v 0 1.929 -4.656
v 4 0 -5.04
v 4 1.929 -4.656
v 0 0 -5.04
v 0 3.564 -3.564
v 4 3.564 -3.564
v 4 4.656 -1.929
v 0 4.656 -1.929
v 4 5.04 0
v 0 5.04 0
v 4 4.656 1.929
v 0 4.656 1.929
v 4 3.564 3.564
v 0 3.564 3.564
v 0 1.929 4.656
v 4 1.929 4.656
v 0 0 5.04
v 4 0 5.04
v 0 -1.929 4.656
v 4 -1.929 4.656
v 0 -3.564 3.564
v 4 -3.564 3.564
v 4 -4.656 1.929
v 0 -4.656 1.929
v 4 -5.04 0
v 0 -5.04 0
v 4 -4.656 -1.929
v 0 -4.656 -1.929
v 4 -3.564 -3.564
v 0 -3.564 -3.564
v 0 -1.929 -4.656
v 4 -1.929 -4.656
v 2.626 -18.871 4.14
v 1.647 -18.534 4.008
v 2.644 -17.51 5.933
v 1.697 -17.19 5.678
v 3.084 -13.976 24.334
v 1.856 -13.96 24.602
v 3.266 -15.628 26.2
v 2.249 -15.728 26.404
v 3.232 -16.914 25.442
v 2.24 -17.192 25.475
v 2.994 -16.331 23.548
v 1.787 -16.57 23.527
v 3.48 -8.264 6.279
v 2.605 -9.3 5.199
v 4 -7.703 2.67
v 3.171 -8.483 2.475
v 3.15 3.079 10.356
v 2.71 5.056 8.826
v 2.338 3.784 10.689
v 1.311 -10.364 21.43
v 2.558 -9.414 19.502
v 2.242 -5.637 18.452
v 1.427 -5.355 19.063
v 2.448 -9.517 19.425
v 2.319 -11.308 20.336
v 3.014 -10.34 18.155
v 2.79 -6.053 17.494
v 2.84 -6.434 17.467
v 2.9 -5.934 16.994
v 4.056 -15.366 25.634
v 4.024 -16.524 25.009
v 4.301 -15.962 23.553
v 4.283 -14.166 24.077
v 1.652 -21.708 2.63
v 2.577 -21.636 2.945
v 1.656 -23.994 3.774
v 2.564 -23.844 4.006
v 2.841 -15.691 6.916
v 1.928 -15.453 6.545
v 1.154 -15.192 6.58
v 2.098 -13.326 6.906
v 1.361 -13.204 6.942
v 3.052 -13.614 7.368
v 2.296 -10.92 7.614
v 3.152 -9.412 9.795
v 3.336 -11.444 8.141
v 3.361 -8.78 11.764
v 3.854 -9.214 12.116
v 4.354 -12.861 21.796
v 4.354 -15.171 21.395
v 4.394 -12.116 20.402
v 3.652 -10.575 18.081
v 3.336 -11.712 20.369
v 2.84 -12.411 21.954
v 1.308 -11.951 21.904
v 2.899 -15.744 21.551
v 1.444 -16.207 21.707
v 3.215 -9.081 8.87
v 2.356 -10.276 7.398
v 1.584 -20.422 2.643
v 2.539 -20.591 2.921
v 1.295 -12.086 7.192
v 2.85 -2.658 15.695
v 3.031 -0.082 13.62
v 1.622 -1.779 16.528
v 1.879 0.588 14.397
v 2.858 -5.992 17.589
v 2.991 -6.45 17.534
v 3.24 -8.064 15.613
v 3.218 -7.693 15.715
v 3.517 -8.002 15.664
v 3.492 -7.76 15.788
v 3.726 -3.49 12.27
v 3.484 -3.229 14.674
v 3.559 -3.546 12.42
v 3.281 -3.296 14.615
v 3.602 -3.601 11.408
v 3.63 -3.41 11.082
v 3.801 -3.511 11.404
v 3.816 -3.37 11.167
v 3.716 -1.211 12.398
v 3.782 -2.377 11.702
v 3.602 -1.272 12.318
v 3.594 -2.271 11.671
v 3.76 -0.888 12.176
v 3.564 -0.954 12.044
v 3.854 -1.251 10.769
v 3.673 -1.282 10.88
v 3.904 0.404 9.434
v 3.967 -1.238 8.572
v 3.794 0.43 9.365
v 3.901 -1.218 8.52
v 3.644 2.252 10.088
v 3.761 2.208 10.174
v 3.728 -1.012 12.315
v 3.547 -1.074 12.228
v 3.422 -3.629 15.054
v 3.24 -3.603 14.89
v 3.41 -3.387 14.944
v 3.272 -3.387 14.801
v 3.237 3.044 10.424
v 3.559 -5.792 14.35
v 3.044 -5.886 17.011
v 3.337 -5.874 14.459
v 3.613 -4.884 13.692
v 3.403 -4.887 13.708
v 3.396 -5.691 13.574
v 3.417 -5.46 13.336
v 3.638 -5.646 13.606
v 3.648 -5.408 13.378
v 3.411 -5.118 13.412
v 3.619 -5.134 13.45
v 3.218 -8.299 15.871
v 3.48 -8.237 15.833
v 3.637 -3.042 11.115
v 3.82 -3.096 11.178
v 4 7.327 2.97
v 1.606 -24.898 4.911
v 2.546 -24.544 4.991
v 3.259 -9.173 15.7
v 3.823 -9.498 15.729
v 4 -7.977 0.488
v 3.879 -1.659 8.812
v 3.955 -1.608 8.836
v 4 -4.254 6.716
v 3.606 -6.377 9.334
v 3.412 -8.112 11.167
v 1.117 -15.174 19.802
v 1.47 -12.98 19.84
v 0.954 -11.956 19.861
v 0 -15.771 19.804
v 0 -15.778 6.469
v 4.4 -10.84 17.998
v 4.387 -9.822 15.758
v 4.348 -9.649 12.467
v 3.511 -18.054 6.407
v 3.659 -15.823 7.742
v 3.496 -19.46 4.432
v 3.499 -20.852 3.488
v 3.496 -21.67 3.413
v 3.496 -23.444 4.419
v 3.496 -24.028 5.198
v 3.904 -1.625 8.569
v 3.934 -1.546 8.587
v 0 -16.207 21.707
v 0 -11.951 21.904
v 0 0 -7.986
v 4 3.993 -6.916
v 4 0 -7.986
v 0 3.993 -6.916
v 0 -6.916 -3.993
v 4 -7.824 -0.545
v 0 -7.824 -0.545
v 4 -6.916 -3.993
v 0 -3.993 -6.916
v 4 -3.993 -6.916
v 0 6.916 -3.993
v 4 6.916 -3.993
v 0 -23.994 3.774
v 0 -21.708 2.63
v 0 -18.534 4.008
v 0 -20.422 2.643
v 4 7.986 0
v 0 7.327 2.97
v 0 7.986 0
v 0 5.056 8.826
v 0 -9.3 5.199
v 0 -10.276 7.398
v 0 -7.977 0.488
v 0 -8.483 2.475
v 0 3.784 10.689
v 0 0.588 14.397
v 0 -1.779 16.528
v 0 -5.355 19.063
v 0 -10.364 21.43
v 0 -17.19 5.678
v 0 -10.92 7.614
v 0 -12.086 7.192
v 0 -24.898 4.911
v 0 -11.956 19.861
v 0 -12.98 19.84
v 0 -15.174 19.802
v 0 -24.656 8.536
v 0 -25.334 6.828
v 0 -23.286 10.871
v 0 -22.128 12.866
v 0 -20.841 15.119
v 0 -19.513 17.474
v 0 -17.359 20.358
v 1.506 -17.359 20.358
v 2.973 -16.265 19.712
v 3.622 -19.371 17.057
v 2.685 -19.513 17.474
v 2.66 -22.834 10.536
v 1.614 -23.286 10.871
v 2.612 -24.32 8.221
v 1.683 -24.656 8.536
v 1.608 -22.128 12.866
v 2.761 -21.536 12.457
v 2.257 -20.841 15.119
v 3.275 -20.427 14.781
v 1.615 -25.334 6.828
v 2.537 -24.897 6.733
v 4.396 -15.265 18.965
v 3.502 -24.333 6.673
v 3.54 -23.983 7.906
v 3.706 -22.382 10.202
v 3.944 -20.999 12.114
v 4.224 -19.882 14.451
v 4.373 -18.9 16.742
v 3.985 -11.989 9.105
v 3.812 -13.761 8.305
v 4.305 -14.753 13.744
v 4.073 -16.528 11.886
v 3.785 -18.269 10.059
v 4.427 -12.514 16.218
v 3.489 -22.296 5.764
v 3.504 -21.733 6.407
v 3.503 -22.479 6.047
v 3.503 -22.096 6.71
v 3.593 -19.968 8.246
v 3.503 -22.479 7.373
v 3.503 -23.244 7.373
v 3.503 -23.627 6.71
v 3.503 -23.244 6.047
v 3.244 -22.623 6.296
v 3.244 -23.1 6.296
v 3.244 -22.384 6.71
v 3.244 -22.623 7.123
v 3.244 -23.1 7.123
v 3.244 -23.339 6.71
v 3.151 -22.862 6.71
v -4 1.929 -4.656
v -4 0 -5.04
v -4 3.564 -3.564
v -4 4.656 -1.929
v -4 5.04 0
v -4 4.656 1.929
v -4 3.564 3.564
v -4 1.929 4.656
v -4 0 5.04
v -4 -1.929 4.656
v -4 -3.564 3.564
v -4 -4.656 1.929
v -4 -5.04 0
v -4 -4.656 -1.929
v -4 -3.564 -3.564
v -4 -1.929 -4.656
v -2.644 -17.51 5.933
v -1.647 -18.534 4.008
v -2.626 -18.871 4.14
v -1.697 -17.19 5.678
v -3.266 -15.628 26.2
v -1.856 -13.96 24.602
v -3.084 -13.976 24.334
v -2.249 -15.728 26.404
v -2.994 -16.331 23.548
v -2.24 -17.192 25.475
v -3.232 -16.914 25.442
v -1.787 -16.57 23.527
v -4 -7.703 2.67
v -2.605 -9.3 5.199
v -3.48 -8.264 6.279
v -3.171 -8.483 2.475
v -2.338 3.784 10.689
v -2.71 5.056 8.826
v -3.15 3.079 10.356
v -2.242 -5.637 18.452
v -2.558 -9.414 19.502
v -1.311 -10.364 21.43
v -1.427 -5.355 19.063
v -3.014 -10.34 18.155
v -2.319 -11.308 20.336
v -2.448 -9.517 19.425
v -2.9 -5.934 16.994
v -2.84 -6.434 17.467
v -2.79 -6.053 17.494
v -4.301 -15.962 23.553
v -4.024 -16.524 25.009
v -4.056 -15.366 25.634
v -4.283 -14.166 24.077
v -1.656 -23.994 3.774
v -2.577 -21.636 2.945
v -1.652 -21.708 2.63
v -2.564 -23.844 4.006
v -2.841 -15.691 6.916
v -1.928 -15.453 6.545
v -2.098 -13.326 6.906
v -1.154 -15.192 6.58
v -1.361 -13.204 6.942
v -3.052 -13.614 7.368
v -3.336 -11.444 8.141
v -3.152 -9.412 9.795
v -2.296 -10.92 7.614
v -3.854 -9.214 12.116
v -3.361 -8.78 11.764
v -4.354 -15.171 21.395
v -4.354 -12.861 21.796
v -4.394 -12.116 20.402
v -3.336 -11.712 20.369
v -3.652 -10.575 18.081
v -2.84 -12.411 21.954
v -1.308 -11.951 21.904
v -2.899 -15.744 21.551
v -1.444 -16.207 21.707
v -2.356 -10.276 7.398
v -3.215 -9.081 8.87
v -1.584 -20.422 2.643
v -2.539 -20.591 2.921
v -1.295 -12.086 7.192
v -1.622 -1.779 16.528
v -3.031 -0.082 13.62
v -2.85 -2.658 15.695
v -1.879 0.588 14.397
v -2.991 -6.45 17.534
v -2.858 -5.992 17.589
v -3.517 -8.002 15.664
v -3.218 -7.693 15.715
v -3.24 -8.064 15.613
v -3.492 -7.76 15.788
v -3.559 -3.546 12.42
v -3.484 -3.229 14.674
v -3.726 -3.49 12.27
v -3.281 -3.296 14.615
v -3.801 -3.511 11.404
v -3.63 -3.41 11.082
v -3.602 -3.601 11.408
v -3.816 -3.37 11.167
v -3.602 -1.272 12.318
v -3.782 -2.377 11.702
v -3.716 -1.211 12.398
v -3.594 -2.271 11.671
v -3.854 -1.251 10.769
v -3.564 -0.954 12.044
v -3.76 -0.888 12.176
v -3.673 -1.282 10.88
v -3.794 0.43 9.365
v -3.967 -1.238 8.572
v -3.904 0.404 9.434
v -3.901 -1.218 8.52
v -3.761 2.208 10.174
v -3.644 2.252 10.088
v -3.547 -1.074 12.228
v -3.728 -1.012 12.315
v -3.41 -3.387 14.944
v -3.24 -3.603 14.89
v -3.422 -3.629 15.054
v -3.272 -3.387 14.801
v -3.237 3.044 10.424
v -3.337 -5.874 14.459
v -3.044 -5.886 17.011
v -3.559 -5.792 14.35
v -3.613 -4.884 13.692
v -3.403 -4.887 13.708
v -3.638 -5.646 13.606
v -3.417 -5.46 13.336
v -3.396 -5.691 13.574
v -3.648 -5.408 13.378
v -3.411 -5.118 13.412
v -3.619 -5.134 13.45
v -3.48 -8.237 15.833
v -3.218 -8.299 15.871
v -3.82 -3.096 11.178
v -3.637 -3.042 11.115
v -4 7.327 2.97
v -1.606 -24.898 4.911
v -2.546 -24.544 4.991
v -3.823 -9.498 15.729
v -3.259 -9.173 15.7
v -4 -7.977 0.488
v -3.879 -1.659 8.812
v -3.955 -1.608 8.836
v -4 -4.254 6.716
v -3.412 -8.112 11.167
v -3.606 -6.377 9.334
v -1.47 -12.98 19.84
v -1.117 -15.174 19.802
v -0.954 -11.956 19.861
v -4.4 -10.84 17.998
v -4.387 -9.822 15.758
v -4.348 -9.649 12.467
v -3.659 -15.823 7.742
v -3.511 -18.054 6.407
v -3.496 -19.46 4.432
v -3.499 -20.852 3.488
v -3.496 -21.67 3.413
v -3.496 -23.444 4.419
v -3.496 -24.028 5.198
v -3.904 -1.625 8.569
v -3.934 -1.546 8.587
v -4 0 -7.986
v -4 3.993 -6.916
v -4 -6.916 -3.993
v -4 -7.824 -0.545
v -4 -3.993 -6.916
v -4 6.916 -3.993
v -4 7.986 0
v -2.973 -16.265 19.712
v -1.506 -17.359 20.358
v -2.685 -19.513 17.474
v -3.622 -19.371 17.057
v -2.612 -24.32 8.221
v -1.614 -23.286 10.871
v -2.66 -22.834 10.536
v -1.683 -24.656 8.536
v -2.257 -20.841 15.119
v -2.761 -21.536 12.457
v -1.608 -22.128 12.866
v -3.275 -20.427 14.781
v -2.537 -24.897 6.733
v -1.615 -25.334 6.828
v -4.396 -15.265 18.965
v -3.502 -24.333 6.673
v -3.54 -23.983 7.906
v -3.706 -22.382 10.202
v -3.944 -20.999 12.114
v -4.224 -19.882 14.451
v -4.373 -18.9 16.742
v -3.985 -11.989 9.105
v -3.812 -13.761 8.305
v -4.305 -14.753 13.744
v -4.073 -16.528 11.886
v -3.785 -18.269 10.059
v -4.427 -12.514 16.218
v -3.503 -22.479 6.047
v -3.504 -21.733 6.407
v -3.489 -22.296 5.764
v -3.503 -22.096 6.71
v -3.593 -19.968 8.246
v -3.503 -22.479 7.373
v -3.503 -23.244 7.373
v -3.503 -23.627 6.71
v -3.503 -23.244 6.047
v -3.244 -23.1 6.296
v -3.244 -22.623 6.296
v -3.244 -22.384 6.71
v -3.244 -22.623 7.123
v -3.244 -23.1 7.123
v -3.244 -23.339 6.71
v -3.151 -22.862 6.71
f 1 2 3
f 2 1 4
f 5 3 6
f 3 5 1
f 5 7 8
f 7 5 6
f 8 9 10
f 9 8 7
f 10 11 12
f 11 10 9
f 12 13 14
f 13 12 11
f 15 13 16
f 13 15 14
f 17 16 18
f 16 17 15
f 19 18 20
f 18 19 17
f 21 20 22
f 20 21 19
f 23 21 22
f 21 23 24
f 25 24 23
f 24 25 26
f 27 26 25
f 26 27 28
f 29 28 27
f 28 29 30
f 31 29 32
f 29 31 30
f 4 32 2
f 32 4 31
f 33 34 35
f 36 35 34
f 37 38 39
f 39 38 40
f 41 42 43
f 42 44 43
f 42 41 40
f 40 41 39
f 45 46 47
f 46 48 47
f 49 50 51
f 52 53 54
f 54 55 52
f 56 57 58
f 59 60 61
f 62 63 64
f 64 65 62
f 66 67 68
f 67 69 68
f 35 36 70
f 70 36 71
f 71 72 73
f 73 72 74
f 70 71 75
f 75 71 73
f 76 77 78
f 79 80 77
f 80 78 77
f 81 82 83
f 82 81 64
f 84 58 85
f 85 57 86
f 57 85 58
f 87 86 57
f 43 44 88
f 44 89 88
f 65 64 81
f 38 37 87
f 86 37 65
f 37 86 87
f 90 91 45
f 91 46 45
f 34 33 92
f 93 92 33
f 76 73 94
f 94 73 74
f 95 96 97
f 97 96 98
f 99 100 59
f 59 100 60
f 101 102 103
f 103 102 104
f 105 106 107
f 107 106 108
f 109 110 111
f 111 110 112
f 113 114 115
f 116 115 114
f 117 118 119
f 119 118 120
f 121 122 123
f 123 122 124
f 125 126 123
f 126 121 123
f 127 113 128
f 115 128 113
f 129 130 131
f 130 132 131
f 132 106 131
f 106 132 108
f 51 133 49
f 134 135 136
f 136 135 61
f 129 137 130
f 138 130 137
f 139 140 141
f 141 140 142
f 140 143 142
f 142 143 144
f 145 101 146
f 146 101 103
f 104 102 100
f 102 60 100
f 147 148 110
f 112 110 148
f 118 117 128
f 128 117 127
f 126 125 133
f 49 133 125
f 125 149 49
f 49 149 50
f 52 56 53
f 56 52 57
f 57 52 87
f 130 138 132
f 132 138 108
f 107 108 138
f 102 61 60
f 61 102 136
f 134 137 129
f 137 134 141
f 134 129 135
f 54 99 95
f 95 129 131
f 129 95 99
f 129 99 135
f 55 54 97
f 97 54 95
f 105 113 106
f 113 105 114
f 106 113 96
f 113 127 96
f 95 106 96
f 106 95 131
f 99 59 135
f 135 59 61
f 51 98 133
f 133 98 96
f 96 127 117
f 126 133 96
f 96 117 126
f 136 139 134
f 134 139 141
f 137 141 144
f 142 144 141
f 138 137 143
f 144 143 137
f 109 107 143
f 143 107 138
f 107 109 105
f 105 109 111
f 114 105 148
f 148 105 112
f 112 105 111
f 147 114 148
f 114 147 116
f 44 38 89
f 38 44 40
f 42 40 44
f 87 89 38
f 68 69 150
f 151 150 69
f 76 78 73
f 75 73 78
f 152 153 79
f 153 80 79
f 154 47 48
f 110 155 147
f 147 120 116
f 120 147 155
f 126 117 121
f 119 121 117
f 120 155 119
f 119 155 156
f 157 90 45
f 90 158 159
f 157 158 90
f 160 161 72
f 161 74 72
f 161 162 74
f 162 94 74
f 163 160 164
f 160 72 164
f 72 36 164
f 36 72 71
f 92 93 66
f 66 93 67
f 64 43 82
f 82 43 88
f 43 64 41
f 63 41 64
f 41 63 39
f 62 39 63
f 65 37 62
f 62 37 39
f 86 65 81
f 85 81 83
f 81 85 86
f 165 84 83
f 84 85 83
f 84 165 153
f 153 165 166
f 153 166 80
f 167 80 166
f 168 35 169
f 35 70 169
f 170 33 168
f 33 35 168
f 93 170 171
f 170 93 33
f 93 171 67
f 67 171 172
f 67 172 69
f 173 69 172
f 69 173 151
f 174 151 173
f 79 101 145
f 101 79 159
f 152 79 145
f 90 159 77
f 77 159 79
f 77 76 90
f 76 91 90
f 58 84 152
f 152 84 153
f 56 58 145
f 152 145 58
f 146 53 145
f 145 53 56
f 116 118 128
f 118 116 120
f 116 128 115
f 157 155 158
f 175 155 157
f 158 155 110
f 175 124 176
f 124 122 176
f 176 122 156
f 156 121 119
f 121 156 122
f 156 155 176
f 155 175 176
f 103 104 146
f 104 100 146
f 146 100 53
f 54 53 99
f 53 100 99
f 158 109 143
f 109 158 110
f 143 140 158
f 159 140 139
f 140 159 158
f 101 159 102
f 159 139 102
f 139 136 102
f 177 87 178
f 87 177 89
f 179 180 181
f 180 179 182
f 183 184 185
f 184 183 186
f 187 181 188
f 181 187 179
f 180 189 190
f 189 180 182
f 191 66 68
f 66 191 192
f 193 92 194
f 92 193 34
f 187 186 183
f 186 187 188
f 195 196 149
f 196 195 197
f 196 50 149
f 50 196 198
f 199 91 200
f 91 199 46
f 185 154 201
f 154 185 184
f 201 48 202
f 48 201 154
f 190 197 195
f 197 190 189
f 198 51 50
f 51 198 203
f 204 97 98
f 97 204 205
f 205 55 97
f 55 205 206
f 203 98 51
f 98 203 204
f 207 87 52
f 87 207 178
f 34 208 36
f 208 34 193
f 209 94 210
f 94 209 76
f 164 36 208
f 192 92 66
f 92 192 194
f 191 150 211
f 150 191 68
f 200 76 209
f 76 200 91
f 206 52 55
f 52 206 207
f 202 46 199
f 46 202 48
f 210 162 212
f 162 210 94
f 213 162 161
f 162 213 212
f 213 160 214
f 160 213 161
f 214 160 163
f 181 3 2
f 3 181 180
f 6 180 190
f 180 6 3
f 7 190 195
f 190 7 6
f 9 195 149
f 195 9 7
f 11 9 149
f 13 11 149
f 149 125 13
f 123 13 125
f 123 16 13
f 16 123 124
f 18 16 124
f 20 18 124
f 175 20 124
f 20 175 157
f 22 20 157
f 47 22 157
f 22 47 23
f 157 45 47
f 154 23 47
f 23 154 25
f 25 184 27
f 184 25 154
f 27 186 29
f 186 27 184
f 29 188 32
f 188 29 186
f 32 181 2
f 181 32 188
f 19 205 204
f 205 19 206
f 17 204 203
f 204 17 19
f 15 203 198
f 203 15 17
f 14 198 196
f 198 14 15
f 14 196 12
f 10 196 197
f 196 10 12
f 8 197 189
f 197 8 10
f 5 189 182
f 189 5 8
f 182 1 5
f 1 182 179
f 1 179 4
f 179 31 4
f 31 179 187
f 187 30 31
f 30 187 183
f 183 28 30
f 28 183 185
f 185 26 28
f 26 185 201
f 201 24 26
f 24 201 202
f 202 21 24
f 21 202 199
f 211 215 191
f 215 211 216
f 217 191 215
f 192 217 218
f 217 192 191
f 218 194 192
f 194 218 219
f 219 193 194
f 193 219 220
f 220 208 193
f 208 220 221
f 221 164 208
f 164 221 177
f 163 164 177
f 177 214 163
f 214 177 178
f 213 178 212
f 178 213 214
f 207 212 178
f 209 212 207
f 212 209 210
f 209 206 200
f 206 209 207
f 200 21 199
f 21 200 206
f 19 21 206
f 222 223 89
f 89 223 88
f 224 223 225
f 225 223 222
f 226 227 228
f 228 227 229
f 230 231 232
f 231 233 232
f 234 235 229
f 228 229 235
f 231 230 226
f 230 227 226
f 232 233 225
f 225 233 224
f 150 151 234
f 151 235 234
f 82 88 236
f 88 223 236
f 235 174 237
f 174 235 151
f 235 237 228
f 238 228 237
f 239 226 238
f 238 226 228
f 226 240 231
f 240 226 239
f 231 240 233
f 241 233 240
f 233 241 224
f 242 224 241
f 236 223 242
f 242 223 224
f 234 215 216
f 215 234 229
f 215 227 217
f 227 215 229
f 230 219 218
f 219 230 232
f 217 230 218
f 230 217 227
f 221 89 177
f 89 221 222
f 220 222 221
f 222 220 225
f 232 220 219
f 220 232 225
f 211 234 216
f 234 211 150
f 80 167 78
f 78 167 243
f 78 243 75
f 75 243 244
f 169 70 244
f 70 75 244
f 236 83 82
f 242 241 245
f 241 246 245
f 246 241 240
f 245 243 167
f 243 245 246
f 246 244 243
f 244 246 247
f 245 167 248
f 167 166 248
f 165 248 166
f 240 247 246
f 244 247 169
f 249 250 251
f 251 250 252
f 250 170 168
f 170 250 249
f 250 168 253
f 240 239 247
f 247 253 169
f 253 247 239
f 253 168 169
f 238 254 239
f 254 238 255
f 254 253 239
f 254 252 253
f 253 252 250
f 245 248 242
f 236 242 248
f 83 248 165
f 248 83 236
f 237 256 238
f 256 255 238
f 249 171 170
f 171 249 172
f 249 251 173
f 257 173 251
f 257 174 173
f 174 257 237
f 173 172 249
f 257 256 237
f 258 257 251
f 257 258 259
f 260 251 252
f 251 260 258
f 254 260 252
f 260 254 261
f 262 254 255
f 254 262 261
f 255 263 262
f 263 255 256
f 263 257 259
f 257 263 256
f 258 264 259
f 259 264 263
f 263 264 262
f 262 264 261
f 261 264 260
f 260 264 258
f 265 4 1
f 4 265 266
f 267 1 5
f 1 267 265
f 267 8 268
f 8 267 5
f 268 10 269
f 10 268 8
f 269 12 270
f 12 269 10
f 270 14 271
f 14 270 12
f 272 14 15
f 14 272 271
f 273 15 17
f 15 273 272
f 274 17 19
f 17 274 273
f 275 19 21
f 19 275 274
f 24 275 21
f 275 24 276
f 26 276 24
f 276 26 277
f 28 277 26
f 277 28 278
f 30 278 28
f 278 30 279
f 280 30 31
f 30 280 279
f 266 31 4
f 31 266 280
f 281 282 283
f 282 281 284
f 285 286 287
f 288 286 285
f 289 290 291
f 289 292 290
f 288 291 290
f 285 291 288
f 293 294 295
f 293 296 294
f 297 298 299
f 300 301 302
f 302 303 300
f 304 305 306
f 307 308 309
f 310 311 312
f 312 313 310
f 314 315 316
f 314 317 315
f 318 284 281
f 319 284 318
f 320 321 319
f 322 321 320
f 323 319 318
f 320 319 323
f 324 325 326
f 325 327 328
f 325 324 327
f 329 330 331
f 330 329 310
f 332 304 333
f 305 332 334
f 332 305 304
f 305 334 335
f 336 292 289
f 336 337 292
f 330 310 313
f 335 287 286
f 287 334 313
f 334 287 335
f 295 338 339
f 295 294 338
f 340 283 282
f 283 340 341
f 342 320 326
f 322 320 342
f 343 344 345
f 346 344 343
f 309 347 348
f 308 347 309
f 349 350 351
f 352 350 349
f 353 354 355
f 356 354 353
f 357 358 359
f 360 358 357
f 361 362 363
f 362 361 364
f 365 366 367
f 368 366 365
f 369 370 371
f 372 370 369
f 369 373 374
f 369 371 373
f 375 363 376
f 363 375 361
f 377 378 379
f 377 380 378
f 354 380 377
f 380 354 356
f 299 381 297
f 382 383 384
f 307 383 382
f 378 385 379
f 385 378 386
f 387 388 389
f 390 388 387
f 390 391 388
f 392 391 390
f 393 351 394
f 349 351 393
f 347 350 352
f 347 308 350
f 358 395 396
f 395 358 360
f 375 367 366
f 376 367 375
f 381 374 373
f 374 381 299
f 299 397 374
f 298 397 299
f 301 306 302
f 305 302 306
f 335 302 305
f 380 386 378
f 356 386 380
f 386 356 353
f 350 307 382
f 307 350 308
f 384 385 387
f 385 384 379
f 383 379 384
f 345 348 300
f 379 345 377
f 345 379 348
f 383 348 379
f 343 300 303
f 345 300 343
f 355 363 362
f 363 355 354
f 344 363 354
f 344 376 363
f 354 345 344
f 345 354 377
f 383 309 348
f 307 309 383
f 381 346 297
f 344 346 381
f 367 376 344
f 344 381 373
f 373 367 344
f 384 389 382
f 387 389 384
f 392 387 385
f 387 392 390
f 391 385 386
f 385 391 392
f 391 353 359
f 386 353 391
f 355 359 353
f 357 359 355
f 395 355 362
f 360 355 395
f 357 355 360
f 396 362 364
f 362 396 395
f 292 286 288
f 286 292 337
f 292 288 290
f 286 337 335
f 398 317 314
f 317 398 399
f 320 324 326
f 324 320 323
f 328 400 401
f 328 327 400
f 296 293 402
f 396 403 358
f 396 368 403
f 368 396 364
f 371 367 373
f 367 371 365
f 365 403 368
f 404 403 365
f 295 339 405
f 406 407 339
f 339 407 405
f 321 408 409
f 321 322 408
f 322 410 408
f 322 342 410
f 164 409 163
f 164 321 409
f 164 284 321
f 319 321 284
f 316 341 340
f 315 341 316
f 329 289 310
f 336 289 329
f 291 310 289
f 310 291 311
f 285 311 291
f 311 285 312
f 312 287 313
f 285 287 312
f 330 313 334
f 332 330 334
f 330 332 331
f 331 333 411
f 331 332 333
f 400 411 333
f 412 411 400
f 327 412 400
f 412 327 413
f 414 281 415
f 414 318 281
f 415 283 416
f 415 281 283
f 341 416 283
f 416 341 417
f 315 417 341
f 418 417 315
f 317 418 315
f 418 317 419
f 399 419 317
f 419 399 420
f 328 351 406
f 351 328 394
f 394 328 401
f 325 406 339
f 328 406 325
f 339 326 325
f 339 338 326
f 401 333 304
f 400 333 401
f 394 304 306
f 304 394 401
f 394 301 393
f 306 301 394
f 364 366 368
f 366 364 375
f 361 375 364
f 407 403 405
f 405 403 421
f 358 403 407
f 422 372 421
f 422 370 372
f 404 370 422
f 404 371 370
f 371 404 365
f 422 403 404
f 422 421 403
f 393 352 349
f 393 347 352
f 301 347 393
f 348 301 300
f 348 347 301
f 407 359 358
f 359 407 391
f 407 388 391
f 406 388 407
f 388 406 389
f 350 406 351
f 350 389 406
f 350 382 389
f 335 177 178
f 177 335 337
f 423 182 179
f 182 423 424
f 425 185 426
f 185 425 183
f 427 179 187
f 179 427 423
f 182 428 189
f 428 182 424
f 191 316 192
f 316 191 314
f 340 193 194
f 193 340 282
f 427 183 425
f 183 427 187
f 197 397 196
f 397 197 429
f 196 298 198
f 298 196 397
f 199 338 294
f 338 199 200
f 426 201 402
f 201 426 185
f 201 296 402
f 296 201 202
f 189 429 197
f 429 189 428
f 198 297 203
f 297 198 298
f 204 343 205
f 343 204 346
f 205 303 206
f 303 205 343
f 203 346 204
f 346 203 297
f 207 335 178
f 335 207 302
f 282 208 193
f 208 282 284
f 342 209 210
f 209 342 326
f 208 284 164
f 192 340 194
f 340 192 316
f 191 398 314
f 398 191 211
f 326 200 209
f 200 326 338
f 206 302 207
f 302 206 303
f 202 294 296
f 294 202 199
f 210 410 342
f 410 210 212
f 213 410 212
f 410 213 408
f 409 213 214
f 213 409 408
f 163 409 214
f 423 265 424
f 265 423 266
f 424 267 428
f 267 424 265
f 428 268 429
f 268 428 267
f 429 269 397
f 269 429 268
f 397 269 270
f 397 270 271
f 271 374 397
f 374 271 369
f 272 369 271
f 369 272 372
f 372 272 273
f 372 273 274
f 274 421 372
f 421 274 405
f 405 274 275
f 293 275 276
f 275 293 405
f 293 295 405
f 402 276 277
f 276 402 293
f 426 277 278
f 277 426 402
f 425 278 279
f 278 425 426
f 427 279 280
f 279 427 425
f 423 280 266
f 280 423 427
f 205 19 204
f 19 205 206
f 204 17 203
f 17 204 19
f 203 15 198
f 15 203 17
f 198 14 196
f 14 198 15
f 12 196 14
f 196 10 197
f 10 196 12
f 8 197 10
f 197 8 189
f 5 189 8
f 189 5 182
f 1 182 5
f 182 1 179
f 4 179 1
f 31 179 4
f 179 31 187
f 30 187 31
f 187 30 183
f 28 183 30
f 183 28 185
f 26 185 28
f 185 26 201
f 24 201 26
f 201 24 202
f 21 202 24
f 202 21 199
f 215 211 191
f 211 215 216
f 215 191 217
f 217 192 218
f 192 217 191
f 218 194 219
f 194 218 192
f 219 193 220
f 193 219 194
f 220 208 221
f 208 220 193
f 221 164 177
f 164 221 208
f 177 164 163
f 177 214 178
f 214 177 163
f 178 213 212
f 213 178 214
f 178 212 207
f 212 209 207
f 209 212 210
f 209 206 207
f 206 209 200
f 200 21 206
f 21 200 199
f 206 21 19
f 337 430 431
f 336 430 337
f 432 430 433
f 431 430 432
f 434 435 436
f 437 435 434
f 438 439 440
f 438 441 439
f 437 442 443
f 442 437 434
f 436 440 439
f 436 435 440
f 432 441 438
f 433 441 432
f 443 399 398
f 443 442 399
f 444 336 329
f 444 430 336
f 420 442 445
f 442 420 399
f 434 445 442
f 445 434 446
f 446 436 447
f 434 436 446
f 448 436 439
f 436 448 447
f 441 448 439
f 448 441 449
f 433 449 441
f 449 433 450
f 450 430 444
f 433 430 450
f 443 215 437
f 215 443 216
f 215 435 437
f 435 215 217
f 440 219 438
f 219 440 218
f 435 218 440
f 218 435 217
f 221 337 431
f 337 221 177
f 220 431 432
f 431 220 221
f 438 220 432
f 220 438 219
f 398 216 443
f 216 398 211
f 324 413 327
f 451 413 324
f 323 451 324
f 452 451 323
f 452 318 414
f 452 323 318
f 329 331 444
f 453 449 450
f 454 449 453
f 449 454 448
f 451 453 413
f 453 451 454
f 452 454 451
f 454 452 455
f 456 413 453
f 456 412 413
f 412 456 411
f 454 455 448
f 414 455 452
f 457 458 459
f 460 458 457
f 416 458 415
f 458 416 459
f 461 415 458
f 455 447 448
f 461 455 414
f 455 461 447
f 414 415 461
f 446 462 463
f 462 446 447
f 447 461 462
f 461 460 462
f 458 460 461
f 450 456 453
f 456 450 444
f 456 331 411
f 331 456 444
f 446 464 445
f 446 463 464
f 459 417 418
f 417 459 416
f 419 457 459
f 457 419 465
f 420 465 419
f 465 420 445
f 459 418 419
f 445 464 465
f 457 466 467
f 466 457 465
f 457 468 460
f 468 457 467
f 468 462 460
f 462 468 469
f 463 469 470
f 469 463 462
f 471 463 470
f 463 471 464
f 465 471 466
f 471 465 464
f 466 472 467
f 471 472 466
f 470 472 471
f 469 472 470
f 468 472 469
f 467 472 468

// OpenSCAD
use <../lib.scad>
use <10350.scad>
use <10351.scad>
function ldraw_lib__10350c01() = [
// 0 Animal Horse Poseable Head
// 0 Name: 10350c01.dat
// 0 Author: Philippe Hurbain [Philo]
// 0 !LDRAW_ORG Shortcut UPDATE 2013-02
// 0 !LICENSE Licensed under CC BY 2.0 and CC BY 4.0 : see CAreadme.txt
// 
// 0 BFC CERTIFY CCW
  [0,"BFC","CERTIFY"],
  [0,"BFC","CCW"],
// 
// 0 !HISTORY 2013-11-18 {LEGO Digital Designer} Original part shape
// 0 !HISTORY 2013-11-18 [Philo] File preparation for LDraw Parts Tracker
// 0 !HISTORY 2013-12-23 [PTadmin] Official Update 2013-02
// 
// 
// 1 16 0 0 0 1 0 0 0 1 0 0 0 1 10350.dat
  [1,16,0,0,0,1,0,0,0,1,0,0,0,1, ldraw_lib__10350()],
// 1 16 0 0 0 1 0 0 0 1 0 0 0 1 10351.dat
  [1,16,0,0,0,1,0,0,0,1,0,0,0,1, ldraw_lib__10351()],
];
module ldraw_lib__10350c01(step=0, col=false, unit=2/5, alt=false, line=0.2, solid=!$preview)
    makepoly(ldraw_lib__10350c01(), step=step, col=col, unit=unit, alt=alt, line=line, solid=solid);
ldraw_lib__10350c01(line=0.2);
